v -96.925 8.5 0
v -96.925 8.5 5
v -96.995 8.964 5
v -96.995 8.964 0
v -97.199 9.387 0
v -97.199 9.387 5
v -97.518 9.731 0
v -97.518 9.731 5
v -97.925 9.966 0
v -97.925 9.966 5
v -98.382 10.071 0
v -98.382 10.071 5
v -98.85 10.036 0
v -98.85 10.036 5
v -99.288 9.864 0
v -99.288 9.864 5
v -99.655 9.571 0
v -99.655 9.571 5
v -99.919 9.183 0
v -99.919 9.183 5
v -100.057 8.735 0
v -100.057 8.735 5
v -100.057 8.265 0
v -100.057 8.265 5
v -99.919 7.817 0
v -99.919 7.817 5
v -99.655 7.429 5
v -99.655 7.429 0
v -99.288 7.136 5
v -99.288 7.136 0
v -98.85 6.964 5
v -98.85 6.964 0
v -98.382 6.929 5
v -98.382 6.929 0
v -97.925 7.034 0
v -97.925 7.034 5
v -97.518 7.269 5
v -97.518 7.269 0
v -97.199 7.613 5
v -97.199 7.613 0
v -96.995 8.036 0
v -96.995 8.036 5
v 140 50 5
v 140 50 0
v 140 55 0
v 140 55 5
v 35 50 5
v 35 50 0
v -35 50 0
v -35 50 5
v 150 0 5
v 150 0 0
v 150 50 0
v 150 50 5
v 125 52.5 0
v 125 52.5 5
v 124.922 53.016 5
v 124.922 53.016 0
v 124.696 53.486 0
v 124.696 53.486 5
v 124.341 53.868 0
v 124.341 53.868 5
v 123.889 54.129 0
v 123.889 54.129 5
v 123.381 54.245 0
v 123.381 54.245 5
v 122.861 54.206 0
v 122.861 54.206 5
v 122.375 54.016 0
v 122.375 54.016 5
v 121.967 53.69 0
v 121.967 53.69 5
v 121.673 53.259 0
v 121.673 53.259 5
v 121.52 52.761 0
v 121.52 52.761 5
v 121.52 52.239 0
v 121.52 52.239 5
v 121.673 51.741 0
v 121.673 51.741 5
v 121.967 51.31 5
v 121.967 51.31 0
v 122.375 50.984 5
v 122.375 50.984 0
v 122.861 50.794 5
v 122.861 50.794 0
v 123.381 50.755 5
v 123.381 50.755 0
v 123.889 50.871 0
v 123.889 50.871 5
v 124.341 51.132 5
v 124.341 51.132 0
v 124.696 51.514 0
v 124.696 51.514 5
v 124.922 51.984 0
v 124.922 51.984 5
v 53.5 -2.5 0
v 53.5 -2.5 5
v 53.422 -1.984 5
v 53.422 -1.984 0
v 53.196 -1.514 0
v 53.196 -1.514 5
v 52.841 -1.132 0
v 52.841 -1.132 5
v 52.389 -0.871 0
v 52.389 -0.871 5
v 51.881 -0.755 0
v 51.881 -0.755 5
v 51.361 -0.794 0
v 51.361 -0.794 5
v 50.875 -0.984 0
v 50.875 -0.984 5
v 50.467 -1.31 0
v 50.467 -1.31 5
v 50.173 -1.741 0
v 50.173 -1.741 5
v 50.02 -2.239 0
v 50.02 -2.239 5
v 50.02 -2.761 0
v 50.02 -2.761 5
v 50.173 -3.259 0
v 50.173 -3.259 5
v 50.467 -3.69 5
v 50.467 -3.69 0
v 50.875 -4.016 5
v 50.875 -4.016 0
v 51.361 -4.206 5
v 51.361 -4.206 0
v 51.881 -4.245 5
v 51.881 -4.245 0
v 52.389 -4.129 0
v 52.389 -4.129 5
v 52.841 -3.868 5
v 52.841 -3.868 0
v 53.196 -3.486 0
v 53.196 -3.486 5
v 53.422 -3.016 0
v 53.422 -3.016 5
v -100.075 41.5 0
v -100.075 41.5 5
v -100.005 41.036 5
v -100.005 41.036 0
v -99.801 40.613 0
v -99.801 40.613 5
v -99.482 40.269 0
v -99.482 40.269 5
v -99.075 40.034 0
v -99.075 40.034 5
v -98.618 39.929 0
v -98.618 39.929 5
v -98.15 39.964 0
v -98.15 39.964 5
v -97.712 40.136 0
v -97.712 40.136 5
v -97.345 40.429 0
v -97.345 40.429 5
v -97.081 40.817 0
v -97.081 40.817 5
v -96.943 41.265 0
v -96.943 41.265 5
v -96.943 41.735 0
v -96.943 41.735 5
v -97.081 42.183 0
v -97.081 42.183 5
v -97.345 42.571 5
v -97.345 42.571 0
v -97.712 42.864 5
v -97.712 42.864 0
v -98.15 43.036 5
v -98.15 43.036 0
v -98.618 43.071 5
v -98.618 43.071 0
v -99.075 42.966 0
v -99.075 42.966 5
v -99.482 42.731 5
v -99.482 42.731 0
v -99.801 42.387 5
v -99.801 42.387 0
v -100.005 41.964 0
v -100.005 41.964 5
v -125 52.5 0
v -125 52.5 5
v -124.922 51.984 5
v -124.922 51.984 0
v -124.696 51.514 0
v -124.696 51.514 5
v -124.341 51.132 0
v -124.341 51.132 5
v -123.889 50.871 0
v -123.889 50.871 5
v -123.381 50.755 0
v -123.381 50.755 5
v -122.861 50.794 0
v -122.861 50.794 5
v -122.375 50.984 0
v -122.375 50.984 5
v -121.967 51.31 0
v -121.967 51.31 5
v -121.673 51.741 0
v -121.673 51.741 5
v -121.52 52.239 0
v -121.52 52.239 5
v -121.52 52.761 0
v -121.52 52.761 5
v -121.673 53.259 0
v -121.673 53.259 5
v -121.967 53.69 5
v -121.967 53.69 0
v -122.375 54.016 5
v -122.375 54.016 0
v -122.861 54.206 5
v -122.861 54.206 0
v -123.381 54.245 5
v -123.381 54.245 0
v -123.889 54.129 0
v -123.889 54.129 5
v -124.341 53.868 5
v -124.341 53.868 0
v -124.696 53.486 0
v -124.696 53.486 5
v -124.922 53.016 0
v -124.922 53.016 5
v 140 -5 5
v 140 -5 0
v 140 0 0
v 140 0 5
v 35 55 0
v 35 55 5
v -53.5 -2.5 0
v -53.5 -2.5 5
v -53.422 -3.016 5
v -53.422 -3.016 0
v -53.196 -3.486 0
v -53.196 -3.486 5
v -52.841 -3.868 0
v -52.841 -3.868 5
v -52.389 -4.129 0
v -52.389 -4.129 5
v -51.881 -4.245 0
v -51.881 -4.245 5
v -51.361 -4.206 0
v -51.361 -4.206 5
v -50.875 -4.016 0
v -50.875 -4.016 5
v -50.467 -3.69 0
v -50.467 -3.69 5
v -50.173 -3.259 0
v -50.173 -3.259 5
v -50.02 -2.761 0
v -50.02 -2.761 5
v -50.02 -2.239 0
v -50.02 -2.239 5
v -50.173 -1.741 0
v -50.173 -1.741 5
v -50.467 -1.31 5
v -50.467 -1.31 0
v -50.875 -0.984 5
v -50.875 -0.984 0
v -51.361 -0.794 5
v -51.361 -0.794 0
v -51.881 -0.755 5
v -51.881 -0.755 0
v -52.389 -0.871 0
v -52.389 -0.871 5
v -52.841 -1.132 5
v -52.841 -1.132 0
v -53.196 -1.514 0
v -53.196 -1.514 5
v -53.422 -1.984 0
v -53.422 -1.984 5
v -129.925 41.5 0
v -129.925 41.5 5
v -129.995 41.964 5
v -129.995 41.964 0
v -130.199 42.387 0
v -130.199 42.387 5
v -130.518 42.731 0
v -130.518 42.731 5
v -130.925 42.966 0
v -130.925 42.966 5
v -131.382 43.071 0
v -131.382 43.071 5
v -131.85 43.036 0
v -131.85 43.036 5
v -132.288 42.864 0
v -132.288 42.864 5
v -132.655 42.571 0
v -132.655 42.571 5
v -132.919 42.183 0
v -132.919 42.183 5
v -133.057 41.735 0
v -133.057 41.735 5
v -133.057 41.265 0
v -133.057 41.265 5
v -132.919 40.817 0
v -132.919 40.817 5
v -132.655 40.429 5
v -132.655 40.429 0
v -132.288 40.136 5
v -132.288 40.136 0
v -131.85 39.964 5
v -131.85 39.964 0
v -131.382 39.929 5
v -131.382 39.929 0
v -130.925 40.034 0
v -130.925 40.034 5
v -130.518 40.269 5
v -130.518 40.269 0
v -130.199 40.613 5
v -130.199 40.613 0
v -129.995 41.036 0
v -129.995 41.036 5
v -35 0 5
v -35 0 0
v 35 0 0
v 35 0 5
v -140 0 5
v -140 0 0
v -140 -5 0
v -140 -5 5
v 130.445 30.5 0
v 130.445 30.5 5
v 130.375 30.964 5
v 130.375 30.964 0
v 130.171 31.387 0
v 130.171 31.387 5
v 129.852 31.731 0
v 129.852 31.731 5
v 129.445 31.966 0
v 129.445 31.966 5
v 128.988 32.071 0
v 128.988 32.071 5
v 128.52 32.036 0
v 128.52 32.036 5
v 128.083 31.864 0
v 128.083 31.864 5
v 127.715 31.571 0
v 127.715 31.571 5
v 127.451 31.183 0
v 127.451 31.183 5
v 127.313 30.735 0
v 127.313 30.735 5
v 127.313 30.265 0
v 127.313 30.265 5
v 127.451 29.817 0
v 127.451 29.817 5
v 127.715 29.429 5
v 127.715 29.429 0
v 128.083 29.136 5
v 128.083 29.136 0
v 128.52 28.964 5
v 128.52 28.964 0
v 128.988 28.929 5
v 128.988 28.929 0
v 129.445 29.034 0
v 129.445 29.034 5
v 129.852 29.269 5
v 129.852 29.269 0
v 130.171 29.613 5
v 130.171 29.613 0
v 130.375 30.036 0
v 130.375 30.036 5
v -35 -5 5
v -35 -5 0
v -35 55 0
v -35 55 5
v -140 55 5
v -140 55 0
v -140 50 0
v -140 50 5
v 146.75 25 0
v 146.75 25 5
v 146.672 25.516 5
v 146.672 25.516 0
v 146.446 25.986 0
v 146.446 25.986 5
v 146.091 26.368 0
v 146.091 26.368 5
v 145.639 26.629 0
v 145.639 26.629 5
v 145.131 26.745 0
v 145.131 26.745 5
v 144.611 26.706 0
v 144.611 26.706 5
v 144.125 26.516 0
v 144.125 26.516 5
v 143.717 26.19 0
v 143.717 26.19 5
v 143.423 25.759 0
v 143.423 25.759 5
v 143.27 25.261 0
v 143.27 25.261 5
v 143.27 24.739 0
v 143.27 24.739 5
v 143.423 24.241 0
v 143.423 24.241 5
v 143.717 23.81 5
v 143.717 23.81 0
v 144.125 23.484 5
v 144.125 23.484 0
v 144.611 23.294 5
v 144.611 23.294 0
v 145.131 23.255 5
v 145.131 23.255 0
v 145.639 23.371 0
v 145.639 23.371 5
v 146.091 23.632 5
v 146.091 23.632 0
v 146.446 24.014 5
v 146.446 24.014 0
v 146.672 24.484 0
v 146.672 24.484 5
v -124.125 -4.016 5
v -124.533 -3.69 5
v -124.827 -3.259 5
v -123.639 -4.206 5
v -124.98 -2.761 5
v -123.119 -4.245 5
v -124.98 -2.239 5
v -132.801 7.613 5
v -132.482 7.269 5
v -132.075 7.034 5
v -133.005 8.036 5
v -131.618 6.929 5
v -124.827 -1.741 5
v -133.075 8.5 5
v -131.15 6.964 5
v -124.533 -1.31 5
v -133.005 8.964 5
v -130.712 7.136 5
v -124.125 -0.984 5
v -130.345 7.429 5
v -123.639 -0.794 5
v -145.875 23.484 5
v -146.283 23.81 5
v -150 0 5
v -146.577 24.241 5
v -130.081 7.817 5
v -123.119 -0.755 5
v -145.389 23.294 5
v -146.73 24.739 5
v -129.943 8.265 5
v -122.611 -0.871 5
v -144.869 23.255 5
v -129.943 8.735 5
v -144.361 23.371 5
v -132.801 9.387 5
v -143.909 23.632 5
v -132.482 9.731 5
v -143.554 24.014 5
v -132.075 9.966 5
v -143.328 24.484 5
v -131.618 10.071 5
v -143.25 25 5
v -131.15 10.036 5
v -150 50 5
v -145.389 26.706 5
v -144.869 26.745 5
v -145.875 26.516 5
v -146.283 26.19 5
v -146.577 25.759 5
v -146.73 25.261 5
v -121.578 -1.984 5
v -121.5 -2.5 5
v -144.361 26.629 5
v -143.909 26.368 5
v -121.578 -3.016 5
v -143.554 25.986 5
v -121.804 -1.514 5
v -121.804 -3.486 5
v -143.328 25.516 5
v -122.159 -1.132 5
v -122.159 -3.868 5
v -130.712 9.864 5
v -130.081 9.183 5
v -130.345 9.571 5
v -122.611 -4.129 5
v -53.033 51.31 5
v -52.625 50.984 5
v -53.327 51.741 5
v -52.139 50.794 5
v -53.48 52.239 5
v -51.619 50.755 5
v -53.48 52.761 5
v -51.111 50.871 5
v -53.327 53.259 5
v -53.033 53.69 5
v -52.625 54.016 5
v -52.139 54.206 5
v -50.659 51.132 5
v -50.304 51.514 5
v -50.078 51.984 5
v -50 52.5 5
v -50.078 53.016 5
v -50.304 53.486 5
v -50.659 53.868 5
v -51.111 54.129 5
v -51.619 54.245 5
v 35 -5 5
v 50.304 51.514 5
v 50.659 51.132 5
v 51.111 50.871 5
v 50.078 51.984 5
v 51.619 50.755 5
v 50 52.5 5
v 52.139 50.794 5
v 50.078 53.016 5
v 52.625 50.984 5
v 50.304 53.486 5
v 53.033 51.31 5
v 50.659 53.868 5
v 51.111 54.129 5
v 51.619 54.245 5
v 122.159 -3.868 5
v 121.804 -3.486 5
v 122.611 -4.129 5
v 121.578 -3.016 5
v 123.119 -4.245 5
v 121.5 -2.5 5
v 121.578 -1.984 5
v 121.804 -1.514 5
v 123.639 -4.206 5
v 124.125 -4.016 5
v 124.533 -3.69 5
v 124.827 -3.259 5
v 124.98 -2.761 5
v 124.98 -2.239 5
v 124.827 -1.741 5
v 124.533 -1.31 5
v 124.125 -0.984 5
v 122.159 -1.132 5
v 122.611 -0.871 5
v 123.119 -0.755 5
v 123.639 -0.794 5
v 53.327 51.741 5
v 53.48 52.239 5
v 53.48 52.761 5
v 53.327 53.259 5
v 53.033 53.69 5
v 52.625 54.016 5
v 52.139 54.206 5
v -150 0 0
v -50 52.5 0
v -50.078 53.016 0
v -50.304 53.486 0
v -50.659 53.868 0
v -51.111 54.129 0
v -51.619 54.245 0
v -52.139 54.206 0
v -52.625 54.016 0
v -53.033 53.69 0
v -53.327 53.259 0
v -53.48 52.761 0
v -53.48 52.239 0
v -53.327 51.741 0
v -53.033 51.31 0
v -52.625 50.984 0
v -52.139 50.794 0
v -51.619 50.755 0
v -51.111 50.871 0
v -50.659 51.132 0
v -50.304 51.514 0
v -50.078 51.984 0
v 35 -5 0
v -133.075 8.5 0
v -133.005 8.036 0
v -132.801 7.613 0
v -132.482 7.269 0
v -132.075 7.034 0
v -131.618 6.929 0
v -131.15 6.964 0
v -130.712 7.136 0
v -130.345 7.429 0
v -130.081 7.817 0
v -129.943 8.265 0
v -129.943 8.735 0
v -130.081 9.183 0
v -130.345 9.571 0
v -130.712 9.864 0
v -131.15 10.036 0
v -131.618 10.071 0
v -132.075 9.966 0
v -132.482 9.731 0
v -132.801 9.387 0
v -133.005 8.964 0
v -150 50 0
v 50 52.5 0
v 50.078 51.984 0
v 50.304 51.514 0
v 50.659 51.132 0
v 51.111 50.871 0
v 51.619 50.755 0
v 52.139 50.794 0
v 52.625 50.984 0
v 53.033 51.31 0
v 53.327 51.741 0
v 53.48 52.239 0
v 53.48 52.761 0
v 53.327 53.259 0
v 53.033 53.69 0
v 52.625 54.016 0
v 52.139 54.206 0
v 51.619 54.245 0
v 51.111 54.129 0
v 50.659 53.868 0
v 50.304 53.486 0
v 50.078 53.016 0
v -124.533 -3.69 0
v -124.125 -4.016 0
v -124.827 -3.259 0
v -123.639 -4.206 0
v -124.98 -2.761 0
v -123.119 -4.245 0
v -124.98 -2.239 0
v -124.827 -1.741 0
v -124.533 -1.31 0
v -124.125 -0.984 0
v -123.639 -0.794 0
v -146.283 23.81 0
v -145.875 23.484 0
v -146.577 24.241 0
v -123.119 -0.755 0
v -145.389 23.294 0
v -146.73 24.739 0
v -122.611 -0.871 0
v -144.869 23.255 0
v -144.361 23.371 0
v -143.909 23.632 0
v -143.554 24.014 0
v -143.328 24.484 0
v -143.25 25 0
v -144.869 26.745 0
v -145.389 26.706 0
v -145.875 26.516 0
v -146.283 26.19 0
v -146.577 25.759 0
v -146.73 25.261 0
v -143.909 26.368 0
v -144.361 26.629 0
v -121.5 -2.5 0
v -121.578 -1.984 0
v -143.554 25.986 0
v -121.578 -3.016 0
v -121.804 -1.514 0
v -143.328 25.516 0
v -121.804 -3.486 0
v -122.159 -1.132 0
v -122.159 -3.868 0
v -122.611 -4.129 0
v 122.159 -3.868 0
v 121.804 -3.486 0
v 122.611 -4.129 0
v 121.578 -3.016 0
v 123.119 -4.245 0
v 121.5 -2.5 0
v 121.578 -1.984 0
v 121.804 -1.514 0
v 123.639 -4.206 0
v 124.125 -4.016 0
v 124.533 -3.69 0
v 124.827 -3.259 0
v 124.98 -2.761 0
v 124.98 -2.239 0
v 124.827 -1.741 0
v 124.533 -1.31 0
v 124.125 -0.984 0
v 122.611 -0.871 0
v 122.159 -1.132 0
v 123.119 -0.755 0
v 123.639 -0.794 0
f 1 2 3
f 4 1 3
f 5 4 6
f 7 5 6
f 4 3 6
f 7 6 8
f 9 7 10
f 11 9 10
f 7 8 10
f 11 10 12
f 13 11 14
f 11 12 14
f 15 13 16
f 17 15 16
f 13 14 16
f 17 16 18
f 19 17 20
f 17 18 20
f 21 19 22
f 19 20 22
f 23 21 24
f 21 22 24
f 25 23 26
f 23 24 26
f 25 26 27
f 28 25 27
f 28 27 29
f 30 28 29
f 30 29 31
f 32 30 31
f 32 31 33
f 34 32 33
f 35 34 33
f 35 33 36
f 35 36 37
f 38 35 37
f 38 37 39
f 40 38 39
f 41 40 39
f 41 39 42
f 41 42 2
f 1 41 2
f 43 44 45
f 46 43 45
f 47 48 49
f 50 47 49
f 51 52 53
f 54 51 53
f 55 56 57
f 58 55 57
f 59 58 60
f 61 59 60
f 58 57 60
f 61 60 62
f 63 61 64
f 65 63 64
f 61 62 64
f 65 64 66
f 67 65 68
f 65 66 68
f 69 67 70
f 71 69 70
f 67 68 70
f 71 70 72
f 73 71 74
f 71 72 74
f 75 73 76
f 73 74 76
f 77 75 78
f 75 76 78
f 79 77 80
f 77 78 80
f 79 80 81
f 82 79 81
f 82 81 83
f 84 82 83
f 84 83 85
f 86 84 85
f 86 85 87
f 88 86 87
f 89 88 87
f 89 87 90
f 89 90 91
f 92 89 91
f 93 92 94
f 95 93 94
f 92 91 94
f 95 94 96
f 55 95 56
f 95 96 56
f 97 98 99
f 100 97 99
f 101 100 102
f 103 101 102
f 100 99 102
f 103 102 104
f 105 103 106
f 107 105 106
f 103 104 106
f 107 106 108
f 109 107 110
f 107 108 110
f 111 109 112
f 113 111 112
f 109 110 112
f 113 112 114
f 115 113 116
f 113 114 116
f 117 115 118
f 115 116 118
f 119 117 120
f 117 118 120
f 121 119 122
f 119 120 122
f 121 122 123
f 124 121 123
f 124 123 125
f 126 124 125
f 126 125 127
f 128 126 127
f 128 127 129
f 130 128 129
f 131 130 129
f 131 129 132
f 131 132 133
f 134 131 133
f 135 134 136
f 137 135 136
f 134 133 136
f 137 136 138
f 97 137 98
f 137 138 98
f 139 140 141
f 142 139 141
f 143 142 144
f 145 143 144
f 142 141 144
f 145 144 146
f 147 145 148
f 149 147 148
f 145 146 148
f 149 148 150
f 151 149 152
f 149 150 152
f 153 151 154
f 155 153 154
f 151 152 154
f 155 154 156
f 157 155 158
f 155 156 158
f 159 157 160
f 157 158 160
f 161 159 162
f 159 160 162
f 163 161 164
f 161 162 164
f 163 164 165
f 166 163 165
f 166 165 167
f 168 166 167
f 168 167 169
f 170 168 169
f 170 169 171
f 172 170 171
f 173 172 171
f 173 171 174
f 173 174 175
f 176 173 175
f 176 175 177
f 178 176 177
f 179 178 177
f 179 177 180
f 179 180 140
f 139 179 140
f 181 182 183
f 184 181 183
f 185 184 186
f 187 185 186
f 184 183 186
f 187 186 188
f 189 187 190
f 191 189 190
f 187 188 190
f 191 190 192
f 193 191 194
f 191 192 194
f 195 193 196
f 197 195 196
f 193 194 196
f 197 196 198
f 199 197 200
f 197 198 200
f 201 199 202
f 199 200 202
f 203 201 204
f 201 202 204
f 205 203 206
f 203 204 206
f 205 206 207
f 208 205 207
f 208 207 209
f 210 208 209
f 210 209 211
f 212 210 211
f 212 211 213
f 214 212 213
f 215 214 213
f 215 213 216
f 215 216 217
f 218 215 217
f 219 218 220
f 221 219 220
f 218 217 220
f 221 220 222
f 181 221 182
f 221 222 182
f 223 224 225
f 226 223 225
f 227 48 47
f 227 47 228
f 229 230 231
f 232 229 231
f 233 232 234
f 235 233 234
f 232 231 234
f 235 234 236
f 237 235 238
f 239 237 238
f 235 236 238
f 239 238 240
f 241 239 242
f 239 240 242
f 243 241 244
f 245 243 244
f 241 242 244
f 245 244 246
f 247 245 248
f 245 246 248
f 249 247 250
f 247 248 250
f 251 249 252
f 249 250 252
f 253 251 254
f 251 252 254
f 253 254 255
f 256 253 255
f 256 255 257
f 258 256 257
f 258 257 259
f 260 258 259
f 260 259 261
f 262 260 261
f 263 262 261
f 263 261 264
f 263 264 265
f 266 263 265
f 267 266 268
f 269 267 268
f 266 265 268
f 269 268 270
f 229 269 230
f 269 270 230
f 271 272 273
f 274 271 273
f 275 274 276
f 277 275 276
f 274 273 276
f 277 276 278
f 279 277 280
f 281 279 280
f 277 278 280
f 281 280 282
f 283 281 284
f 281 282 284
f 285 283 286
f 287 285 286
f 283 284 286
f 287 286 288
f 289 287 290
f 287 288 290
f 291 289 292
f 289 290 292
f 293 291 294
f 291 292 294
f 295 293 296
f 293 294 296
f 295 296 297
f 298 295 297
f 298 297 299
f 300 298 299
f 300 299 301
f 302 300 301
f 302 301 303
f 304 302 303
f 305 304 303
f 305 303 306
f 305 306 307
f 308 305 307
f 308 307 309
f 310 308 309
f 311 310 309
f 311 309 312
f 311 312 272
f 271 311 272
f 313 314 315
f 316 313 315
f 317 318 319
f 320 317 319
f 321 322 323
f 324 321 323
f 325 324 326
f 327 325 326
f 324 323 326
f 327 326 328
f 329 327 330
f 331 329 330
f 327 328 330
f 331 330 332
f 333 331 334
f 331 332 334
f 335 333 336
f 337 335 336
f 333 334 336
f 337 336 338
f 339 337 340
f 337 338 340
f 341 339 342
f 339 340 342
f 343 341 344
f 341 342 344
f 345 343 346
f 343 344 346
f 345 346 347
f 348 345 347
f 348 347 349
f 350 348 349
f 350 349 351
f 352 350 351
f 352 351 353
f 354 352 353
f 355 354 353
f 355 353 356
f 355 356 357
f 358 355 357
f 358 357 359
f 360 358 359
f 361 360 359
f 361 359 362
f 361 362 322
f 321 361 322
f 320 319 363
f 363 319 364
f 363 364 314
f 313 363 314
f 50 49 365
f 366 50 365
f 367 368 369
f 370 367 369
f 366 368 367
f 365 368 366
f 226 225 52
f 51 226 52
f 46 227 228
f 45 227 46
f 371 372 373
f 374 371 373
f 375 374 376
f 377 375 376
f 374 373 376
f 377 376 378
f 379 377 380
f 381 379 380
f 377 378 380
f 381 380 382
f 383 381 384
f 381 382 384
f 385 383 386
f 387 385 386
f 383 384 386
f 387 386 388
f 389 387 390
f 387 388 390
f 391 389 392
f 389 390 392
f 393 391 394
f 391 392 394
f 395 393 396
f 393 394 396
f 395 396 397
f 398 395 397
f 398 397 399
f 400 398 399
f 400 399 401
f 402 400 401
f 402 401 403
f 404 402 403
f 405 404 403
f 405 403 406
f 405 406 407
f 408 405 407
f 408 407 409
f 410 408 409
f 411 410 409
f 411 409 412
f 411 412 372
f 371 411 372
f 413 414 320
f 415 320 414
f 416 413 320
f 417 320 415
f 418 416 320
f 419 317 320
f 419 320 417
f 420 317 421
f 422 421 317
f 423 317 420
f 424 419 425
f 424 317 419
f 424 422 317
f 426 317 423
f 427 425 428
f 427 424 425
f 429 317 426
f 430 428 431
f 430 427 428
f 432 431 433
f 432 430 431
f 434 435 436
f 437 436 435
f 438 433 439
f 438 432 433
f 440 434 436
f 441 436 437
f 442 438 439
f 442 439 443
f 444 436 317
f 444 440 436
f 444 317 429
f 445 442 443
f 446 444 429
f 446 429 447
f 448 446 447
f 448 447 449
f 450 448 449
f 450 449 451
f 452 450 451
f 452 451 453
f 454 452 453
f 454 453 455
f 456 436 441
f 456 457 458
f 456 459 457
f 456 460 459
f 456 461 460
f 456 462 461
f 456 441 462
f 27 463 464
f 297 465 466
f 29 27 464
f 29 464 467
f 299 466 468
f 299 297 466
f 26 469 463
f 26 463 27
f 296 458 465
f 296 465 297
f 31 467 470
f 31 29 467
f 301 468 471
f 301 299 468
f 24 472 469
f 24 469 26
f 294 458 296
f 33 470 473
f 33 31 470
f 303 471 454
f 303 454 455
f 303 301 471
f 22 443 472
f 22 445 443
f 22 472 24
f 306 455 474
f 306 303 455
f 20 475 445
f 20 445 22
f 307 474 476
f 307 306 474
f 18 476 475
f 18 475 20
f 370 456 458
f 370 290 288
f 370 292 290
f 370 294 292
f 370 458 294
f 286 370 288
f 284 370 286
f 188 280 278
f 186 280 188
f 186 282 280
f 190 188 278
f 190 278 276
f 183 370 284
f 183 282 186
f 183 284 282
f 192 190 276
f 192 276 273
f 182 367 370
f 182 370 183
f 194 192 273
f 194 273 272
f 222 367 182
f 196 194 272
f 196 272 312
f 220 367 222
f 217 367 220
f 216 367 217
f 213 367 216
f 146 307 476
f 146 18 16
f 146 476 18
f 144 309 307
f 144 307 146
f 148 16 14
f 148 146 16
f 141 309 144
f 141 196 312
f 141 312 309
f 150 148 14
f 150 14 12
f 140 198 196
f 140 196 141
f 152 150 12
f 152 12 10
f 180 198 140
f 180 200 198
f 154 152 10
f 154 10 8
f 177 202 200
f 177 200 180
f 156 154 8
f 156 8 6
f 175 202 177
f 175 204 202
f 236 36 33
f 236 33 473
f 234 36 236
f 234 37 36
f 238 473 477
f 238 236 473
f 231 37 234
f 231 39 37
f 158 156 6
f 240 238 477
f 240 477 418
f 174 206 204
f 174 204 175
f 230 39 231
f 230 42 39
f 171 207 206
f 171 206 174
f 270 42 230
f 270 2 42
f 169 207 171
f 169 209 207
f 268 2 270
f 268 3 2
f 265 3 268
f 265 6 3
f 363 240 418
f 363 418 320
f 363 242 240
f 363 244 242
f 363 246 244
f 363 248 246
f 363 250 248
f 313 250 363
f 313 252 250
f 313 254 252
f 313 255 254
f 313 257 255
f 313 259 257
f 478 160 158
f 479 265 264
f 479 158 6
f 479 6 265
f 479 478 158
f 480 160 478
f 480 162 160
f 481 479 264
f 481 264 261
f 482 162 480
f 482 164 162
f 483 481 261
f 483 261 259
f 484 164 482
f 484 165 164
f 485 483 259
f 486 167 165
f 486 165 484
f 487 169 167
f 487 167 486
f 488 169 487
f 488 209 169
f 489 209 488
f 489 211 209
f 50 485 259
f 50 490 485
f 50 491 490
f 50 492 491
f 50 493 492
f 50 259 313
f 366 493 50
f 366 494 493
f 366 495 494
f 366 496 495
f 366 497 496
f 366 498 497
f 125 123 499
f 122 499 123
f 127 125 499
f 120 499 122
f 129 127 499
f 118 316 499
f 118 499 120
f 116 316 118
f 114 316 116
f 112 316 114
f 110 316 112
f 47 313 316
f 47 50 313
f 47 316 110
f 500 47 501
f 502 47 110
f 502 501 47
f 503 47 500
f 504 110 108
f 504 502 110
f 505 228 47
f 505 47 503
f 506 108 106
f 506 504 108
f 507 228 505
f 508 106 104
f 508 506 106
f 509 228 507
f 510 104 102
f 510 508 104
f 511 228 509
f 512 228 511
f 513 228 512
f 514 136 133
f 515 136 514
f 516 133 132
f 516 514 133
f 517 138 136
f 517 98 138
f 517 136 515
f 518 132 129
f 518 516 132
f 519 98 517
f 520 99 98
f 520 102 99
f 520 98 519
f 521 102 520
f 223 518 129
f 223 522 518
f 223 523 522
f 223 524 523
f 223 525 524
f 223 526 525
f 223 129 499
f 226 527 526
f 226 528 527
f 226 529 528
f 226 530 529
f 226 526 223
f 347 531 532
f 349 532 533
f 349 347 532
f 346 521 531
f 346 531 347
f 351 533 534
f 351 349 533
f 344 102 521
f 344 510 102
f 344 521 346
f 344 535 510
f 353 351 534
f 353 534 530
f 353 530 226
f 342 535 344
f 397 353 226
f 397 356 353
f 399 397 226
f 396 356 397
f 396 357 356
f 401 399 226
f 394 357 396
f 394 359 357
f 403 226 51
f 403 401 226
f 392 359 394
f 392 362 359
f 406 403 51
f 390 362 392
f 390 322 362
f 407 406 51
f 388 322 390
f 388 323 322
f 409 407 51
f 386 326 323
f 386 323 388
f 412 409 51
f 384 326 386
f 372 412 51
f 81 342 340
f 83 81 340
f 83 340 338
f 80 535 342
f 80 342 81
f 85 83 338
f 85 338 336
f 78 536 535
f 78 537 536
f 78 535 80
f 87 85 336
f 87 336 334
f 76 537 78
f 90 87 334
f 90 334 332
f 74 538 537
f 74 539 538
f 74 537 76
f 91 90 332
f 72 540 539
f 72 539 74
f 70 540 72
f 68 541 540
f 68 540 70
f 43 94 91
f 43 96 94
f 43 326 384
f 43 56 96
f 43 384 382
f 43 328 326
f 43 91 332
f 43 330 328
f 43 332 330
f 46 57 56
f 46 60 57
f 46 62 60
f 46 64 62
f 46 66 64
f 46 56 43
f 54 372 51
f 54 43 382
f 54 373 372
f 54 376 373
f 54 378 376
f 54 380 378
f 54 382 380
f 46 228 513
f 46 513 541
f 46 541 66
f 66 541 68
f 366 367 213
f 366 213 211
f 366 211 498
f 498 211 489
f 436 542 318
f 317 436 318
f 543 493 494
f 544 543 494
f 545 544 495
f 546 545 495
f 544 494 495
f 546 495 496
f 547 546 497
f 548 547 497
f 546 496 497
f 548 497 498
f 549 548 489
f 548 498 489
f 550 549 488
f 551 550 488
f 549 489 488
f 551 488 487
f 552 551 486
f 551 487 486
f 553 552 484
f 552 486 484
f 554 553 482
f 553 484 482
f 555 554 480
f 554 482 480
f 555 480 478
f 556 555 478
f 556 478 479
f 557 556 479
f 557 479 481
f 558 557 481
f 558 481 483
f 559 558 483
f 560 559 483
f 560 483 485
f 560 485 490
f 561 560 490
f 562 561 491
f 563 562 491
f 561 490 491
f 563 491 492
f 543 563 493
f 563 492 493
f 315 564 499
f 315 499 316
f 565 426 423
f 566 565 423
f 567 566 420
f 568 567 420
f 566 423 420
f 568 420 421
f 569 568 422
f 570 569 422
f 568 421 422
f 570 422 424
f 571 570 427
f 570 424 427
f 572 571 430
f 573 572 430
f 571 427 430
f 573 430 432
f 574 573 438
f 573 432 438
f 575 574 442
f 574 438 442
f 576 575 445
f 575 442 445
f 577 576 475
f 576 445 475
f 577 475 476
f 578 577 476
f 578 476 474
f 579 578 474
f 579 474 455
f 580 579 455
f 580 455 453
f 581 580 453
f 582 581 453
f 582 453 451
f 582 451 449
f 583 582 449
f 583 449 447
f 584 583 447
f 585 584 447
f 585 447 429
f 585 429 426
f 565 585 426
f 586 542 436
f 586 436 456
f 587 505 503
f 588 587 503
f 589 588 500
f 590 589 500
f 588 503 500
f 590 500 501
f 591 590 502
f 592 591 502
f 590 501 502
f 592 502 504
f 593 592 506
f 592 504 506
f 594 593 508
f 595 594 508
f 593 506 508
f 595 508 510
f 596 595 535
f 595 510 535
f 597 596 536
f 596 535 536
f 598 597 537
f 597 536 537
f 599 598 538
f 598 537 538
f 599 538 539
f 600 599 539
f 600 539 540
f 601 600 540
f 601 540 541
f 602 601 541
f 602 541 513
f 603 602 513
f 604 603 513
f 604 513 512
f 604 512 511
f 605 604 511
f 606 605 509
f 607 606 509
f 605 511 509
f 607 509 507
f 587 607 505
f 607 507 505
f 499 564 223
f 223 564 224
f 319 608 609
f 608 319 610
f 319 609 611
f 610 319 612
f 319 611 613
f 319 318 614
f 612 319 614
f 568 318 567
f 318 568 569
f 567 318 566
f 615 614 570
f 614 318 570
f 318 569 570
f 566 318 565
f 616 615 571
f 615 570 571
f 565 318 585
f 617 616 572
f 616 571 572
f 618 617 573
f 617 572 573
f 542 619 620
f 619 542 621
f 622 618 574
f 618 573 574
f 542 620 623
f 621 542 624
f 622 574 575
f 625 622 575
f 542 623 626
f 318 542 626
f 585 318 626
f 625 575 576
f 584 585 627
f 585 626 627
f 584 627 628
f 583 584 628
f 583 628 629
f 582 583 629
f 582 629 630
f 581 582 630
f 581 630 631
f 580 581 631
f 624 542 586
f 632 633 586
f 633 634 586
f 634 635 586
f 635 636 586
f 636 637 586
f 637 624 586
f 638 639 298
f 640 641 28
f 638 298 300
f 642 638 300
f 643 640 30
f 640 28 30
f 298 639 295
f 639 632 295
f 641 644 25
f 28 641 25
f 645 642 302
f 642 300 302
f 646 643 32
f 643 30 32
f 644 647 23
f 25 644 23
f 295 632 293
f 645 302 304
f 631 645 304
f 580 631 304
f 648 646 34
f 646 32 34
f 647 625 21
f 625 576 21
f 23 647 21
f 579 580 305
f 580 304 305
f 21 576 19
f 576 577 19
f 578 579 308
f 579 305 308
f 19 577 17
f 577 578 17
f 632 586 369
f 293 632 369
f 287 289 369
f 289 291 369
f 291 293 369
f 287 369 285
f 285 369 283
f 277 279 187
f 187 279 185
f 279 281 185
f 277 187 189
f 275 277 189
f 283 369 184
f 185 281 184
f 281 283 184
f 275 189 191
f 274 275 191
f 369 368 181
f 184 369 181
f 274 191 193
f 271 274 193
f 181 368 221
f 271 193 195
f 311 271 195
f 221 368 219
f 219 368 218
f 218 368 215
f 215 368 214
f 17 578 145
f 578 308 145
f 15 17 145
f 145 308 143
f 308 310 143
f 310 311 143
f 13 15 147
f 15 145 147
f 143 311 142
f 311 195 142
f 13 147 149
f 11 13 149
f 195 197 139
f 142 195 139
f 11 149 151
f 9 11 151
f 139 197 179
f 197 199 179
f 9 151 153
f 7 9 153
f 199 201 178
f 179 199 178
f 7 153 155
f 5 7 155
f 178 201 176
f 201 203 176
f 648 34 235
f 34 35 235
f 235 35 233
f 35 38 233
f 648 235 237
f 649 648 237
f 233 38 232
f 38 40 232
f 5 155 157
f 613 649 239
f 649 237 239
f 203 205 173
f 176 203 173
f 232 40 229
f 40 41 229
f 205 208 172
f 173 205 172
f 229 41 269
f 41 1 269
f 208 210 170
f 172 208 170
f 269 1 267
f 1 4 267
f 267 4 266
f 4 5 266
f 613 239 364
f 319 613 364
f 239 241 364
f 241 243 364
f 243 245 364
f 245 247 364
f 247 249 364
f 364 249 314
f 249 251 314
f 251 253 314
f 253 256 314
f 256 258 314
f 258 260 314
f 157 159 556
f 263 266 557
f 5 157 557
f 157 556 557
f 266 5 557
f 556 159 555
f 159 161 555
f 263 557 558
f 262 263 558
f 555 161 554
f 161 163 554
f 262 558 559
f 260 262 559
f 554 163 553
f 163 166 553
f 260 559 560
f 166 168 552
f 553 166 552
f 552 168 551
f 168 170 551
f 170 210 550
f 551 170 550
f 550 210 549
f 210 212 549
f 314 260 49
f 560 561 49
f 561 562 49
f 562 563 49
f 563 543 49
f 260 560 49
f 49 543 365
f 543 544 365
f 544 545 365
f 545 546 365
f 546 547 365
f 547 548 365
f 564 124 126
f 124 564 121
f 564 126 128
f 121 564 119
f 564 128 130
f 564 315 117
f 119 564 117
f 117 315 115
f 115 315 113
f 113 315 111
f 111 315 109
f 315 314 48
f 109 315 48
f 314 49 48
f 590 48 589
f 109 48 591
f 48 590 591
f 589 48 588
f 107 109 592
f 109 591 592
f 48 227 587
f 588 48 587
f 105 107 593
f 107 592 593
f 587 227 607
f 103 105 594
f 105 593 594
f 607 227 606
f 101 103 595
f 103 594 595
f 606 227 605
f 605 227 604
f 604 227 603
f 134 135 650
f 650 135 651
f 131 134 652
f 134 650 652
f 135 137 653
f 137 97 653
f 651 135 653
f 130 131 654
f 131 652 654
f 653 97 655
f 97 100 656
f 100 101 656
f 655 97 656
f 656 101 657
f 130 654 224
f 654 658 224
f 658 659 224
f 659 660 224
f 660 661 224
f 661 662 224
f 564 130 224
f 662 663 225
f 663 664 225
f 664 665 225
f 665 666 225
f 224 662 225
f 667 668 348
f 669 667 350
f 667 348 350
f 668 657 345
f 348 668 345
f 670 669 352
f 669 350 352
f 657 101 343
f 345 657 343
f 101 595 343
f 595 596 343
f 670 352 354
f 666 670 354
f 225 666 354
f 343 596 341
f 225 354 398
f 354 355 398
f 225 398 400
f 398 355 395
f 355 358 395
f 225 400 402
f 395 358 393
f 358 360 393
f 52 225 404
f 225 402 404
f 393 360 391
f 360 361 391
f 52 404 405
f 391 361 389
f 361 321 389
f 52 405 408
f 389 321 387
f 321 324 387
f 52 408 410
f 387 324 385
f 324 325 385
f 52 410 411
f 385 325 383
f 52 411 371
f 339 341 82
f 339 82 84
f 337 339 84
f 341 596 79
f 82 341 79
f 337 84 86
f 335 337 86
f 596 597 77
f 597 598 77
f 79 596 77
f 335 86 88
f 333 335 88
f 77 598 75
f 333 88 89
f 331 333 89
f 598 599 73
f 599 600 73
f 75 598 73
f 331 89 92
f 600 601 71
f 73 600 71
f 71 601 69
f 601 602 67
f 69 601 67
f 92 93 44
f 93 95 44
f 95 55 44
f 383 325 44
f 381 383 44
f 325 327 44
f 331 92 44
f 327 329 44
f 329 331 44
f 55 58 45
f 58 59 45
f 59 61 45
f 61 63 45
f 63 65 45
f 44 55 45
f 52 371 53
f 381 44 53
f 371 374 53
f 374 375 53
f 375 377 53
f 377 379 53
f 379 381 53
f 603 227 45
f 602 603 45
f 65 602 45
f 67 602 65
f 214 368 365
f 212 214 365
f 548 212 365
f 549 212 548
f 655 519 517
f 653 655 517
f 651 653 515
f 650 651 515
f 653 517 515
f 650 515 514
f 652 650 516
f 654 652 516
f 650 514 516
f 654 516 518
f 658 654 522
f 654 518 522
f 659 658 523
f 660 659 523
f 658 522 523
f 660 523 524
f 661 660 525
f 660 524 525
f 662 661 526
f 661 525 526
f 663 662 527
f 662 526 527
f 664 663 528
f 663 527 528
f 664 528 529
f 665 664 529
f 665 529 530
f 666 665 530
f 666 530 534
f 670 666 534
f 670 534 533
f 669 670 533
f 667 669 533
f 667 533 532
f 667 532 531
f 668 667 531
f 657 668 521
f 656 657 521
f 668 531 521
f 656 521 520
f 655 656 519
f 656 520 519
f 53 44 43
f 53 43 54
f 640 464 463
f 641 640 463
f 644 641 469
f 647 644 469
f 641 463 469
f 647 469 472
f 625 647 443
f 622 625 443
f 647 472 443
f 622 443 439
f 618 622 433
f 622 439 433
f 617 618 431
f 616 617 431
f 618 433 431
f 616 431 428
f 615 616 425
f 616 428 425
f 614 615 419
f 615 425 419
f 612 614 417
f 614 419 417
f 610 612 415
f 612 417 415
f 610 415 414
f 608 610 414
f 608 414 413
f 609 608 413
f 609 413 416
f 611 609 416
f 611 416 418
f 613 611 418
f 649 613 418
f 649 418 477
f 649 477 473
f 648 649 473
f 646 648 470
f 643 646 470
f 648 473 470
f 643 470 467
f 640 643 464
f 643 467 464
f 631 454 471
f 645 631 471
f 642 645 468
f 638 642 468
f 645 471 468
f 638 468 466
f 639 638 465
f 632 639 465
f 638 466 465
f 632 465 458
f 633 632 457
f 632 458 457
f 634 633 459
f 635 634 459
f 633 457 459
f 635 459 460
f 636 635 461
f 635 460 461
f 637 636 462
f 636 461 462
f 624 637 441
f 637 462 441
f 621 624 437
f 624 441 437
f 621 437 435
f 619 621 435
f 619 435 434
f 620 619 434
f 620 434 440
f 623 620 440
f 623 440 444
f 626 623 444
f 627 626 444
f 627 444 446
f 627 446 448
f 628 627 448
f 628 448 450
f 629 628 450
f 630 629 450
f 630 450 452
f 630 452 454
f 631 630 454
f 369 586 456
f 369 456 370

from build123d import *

# Parameters (mm, degrees)
SKETCH1_W           = 105
SKETCH1_H           = 5
SKETCH1_W_2         = 10
SKETCH1_H_2         = 50
BOSS_EXTRUDE1_DEPTH = 5
SKETCH2_R           = 1.75
CUT_EXTRUDE1_DEPTH  = 5
SKETCH3_R           = 1.75
CUT_EXTRUDE2_DEPTH  = 10
SKETCH5_R           = 1.575
CUT_EXTRUDE4_DEPTH  = 160.843673631


with BuildPart() as part:
    # Sketch1 → Boss-Extrude1 (new body)
    with BuildSketch(Plane.XY):
        Polygon((-35, 0), (0, 0), (0, 50), (-35, 50), (-140, 50), (-140, 0), align=None)
        Polygon((0, 50), (0, 0), (35, 0), (140, 0), (140, 50), (35, 50), align=None)
        with Locations((-87.5, -2.5)):
            Rectangle(SKETCH1_W, SKETCH1_H)
        with Locations((87.5, -2.5)):
            Rectangle(SKETCH1_W, SKETCH1_H)
        with Locations((-87.5, 52.5)):
            Rectangle(SKETCH1_W, SKETCH1_H)
        with Locations((87.5, 52.5)):
            Rectangle(SKETCH1_W, SKETCH1_H)
        with Locations((-145, 25)):
            Rectangle(SKETCH1_W_2, SKETCH1_H_2)
        with Locations((145, 25)):
            Rectangle(SKETCH1_W_2, SKETCH1_H_2)
    extrude(amount=BOSS_EXTRUDE1_DEPTH)

    # Sketch2 → Cut-Extrude1 (cut)
    with BuildSketch(Plane.XY.offset(5)):
        with Locations((-123.25, -2.5)):
            Circle(SKETCH2_R)
        with Locations(Location((-51.75, -2.5, 0), (0, 0, 180))):
            Circle(SKETCH2_R)
        with Locations((51.75, -2.5)):
            Circle(SKETCH2_R)
        with Locations(Location((123.25, -2.5, 0), (0, 0, 180))):
            Circle(SKETCH2_R)
        with Locations((123.25, 52.5)):
            Circle(SKETCH2_R)
        with Locations(Location((51.75, 52.5, 0), (0, 0, 180))):
            Circle(SKETCH2_R)
        with Locations((-51.75, 52.5)):
            Circle(SKETCH2_R)
        with Locations(Location((-123.25, 52.5, 0), (0, 0, 180))):
            Circle(SKETCH2_R)
    extrude(amount=-CUT_EXTRUDE1_DEPTH, mode=Mode.SUBTRACT)

    # Sketch3 → Cut-Extrude2 (cut)
    with BuildSketch(Plane.XY.offset(5)):
        with Locations((-145, 25)):
            Circle(SKETCH3_R)
        with Locations((145, 25)):
            Circle(SKETCH3_R)
    extrude(amount=-CUT_EXTRUDE2_DEPTH, mode=Mode.SUBTRACT)

    # Sketch5 → Cut-Extrude4 (cut, through all)
    with BuildSketch(Plane.XY.offset(5)):
        with Locations((-131.5, 41.5)):
            Circle(SKETCH5_R)
        with Locations(Location((-98.5, 41.5, 0), (0, 0, 180))):
            Circle(SKETCH5_R)
        with Locations((-98.5, 8.5)):
            Circle(SKETCH5_R)
        with Locations(Location((-131.5, 8.5, 0), (0, 0, 180))):
            Circle(SKETCH5_R)
        with Locations((128.87, 30.5)):
            Circle(SKETCH5_R)
    extrude(amount=-CUT_EXTRUDE4_DEPTH, mode=Mode.SUBTRACT)


solid = part.part
